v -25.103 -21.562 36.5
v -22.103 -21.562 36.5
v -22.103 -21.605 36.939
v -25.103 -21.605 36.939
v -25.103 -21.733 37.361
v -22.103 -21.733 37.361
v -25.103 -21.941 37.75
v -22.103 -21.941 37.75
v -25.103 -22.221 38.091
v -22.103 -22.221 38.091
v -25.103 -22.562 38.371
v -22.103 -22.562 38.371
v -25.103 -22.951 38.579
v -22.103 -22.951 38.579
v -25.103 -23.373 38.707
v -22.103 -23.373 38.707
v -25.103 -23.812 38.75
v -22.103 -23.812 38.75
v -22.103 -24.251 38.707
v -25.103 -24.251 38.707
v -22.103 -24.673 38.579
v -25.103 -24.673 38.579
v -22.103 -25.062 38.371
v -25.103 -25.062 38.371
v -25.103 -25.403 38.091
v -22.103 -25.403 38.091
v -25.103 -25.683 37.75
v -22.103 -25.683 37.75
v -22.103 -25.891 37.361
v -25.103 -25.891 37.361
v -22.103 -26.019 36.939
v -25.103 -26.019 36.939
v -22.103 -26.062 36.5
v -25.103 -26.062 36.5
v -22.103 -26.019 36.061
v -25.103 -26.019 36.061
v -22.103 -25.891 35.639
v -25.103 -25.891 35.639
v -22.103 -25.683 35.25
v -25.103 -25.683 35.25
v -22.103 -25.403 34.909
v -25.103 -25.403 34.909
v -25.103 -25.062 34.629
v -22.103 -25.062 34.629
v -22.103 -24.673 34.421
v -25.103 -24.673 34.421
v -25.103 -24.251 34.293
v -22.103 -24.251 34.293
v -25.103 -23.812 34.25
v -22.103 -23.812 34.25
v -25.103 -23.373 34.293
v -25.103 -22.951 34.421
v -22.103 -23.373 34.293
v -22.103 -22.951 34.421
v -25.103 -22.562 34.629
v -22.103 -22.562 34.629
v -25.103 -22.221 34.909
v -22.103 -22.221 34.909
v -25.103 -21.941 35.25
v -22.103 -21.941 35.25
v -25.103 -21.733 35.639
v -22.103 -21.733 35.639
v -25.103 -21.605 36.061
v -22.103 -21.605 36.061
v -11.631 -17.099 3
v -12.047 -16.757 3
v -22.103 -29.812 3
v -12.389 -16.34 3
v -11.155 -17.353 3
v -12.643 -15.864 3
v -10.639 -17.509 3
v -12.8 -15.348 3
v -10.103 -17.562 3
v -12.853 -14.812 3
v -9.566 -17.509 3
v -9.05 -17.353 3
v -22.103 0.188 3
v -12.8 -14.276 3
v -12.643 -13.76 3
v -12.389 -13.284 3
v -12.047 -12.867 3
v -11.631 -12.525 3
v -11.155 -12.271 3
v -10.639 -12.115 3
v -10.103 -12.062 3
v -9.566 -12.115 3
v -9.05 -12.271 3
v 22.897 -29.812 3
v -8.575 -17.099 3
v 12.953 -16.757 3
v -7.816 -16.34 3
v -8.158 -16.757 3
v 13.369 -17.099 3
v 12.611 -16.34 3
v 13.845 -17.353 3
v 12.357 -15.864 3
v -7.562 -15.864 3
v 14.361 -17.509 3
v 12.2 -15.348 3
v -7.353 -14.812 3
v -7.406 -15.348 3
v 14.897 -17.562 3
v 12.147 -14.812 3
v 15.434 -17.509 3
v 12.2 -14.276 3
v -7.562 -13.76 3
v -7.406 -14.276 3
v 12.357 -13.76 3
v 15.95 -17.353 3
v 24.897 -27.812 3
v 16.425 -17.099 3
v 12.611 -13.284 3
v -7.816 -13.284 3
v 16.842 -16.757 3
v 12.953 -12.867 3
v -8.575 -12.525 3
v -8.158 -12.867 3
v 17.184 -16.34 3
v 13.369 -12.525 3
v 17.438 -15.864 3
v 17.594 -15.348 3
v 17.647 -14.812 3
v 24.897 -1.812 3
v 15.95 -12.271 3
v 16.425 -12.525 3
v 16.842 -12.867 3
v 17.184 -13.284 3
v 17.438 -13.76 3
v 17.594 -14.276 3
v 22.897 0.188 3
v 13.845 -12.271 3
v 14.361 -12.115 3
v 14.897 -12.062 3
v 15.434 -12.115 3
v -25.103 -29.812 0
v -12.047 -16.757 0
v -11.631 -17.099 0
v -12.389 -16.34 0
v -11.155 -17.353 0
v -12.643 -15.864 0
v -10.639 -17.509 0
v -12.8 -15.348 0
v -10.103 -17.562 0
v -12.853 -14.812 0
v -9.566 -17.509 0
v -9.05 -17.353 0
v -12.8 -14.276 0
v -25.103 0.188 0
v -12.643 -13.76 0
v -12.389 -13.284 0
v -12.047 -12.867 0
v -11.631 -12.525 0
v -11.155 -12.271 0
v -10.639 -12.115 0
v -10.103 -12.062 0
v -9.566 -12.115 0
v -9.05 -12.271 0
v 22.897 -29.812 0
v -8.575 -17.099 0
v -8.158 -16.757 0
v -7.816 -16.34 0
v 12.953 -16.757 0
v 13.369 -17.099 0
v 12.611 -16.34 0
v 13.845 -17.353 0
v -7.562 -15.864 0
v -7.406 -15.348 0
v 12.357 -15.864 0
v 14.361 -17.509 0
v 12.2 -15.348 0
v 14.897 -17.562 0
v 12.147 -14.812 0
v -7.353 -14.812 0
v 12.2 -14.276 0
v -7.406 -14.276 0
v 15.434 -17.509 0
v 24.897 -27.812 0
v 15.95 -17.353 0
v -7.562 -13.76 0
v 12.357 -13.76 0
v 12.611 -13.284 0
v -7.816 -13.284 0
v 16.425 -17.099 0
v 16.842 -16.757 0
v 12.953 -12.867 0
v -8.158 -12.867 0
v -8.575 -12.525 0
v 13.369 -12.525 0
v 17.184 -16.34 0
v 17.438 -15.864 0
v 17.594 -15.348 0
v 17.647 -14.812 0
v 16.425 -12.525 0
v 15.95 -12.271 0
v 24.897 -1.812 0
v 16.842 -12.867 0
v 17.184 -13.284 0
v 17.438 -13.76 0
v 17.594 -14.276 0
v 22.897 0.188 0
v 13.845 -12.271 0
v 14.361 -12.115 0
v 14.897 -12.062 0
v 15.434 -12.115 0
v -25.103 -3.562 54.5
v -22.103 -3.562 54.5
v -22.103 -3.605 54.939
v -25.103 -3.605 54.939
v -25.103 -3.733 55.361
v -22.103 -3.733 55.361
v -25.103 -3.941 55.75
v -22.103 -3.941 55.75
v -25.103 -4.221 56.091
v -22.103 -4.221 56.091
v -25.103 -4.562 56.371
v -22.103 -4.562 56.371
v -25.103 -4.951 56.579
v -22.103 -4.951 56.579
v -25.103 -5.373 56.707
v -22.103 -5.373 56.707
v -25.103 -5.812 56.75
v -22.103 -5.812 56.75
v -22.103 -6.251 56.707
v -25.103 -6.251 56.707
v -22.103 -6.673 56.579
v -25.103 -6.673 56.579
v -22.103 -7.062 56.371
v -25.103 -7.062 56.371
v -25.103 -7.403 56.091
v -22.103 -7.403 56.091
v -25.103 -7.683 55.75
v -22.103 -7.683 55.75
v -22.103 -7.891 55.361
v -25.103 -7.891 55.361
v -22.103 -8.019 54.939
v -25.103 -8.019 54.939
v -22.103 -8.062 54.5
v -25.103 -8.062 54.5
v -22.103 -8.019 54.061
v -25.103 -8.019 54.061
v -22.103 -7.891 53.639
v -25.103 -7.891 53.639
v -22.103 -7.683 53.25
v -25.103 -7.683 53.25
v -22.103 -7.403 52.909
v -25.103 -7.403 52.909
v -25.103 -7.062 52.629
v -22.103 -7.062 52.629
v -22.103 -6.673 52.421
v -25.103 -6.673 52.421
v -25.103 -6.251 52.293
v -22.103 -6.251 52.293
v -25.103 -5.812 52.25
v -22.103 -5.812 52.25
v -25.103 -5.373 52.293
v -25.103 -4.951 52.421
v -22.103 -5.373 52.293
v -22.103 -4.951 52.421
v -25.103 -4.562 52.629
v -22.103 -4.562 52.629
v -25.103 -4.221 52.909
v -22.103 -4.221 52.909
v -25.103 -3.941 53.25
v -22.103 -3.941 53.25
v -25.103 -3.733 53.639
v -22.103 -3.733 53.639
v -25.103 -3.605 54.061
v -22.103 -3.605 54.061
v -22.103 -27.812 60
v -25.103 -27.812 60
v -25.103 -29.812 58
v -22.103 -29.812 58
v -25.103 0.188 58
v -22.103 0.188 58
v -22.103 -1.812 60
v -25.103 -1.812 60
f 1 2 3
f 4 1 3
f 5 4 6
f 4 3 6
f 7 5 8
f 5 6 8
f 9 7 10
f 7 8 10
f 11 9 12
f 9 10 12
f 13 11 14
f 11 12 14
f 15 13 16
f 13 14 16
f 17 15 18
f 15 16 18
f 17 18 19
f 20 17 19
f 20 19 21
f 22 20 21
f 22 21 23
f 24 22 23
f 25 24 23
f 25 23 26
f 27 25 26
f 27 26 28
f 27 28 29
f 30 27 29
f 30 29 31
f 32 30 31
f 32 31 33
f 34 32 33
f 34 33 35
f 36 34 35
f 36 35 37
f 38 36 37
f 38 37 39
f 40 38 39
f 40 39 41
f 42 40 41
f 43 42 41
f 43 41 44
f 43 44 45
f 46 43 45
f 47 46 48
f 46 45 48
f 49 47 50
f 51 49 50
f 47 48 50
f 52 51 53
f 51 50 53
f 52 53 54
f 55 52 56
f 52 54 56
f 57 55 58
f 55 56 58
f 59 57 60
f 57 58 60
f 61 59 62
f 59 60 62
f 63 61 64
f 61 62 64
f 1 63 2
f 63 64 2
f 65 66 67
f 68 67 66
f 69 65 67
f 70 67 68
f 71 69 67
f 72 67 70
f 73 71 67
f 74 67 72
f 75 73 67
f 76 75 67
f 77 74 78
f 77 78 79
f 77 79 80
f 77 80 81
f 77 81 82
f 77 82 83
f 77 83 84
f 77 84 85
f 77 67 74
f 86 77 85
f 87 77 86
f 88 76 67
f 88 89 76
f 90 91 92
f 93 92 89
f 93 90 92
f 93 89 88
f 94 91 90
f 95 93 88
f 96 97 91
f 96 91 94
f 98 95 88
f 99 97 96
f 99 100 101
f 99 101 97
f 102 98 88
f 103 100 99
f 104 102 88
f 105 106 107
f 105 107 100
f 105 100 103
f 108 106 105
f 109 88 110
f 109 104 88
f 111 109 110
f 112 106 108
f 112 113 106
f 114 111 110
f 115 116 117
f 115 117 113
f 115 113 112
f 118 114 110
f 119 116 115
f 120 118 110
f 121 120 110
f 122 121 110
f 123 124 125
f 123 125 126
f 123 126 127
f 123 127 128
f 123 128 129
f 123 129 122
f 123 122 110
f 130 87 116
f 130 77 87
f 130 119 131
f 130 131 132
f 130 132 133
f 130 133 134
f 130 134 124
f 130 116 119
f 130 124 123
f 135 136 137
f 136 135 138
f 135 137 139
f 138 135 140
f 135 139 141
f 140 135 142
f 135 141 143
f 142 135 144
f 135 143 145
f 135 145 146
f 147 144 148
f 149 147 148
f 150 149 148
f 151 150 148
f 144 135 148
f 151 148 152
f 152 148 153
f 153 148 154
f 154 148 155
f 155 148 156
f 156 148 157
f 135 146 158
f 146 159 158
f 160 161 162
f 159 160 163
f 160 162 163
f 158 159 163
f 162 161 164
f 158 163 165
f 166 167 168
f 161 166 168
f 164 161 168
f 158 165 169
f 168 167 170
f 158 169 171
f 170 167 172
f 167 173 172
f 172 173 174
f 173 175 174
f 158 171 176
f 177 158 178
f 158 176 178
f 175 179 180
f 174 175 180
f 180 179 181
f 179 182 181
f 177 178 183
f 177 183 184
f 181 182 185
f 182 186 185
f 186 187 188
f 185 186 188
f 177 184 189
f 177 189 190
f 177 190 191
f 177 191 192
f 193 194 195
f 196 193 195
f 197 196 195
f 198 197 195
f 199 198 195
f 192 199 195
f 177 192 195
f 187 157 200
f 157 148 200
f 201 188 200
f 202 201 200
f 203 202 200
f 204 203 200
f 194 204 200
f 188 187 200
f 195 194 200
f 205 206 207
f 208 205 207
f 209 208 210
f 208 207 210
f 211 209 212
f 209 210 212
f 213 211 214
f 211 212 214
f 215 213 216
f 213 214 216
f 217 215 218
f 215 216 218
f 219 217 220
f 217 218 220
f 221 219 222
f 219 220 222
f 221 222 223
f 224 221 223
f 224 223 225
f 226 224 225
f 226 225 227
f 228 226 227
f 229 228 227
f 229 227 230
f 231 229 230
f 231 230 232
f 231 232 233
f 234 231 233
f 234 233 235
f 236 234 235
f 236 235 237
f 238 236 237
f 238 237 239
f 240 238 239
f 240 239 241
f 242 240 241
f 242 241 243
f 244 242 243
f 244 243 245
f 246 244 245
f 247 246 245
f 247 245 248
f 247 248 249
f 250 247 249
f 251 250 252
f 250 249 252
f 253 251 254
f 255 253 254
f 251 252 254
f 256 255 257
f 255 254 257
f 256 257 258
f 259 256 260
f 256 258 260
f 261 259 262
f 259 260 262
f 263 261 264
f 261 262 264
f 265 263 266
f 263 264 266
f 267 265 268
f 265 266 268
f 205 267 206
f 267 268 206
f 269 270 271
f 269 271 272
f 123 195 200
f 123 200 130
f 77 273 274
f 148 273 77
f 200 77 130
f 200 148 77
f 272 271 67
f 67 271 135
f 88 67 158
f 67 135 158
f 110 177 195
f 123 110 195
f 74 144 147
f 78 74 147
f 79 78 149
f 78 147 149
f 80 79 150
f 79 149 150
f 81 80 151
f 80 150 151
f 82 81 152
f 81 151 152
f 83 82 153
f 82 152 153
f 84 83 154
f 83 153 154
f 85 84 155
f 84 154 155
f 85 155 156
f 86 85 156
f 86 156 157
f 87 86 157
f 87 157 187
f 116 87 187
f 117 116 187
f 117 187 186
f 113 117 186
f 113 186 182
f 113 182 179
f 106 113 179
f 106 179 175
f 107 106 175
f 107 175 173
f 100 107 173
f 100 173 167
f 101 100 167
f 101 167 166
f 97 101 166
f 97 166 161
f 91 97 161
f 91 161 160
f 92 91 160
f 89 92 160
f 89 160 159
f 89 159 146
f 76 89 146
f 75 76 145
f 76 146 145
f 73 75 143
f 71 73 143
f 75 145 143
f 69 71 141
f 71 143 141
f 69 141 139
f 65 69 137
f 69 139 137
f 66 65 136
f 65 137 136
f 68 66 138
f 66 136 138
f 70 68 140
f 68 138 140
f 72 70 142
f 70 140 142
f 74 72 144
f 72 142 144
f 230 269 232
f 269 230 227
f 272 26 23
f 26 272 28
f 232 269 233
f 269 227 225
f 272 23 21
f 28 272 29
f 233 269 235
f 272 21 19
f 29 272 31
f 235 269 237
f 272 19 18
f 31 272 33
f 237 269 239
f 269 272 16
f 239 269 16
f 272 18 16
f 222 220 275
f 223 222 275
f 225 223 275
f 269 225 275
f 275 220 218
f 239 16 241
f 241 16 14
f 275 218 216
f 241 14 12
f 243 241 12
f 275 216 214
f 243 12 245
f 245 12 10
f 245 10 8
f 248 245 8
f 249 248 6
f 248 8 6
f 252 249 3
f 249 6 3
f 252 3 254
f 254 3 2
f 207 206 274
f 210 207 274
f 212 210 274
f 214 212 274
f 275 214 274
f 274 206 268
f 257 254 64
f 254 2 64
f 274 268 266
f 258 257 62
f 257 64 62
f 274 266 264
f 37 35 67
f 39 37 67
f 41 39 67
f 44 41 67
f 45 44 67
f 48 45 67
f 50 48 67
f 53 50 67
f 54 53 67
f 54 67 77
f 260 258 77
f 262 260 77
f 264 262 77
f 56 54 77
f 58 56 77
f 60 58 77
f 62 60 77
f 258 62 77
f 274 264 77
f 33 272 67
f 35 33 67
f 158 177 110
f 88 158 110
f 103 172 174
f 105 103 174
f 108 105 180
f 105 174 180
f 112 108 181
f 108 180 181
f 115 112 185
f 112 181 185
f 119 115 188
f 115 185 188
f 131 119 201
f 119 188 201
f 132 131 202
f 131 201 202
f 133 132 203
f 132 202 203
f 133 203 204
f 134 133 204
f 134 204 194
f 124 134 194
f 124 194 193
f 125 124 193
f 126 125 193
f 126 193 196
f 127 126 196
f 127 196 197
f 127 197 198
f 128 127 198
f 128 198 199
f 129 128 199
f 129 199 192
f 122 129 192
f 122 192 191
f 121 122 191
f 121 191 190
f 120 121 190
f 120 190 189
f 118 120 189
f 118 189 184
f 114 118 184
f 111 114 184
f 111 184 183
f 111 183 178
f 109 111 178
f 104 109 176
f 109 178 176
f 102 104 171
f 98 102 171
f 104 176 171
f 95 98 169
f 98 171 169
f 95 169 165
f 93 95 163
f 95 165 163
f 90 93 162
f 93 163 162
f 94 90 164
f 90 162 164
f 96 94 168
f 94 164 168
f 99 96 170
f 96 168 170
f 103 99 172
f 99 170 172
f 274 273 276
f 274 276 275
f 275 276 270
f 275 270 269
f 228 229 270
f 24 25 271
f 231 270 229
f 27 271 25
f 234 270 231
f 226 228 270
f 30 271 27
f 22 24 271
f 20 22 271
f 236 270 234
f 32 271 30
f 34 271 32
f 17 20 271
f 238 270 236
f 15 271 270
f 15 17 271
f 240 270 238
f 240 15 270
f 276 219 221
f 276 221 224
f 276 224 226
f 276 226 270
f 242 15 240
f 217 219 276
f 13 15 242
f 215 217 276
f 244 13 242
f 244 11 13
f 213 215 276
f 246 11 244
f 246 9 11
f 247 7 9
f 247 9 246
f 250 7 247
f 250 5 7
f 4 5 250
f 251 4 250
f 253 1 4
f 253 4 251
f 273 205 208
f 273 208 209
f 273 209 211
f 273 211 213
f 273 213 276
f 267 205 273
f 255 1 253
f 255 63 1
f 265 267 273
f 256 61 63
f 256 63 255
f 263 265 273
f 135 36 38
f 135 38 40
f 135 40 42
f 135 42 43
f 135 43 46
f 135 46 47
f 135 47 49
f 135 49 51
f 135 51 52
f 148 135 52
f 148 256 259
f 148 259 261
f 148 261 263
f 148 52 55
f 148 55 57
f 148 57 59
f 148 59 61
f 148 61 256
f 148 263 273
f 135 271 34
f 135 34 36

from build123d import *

# Parameters (mm, degrees)
F0_W     = 47
F0_H     = 30
F1_DEPTH = 3
F0_W_2   = 3
F2_DEPTH = 60
F4_D     = 4.5
F4_DEPTH = 12.4
F6_D     = 5.5
F6_DEPTH = 12.4
F7_SIZE  = 2


with BuildPart() as f1:
    # F0 (on Top) → F1 (new body)
    with BuildSketch(Plane.XY):
        with Locations((1.397237, -14.812001)):
            Rectangle(F0_W, F0_H)
    extrude(amount=F1_DEPTH)

    # F0 (on Top) → F2 (join)
    with BuildSketch(Plane.XY):
        with Locations((-23.602763, -14.812001)):
            Rectangle(F0_W_2, F0_H)
    extrude(amount=F2_DEPTH)

    # F4
    with Locations(Plane(origin=(-25.102763, 0, 0), x_dir=(0, -1, 0), z_dir=(-1, 0, 0))):
        with Locations((5.812001, 54.5), (23.812001, 36.5)):
            Hole(F4_D / 2, depth=F4_DEPTH)

    # F6
    with Locations(Plane.XY.offset(3)):
        with Locations((-10.102763, -14.812001), (14.897237, -14.812001)):
            Hole(F6_D / 2, depth=F6_DEPTH)

    # F7
    f7_edges = [f1.edges().sort_by_distance(p)[0] for p in [
        (-23.602763, -29.812001, 60),
        (-23.602763, 0.187999, 60),
        (24.897237, -29.812001, 1.5),
        (24.897237, 0.187999, 1.5),
    ]]
    chamfer(f7_edges, length=F7_SIZE)


solid = f1.part
